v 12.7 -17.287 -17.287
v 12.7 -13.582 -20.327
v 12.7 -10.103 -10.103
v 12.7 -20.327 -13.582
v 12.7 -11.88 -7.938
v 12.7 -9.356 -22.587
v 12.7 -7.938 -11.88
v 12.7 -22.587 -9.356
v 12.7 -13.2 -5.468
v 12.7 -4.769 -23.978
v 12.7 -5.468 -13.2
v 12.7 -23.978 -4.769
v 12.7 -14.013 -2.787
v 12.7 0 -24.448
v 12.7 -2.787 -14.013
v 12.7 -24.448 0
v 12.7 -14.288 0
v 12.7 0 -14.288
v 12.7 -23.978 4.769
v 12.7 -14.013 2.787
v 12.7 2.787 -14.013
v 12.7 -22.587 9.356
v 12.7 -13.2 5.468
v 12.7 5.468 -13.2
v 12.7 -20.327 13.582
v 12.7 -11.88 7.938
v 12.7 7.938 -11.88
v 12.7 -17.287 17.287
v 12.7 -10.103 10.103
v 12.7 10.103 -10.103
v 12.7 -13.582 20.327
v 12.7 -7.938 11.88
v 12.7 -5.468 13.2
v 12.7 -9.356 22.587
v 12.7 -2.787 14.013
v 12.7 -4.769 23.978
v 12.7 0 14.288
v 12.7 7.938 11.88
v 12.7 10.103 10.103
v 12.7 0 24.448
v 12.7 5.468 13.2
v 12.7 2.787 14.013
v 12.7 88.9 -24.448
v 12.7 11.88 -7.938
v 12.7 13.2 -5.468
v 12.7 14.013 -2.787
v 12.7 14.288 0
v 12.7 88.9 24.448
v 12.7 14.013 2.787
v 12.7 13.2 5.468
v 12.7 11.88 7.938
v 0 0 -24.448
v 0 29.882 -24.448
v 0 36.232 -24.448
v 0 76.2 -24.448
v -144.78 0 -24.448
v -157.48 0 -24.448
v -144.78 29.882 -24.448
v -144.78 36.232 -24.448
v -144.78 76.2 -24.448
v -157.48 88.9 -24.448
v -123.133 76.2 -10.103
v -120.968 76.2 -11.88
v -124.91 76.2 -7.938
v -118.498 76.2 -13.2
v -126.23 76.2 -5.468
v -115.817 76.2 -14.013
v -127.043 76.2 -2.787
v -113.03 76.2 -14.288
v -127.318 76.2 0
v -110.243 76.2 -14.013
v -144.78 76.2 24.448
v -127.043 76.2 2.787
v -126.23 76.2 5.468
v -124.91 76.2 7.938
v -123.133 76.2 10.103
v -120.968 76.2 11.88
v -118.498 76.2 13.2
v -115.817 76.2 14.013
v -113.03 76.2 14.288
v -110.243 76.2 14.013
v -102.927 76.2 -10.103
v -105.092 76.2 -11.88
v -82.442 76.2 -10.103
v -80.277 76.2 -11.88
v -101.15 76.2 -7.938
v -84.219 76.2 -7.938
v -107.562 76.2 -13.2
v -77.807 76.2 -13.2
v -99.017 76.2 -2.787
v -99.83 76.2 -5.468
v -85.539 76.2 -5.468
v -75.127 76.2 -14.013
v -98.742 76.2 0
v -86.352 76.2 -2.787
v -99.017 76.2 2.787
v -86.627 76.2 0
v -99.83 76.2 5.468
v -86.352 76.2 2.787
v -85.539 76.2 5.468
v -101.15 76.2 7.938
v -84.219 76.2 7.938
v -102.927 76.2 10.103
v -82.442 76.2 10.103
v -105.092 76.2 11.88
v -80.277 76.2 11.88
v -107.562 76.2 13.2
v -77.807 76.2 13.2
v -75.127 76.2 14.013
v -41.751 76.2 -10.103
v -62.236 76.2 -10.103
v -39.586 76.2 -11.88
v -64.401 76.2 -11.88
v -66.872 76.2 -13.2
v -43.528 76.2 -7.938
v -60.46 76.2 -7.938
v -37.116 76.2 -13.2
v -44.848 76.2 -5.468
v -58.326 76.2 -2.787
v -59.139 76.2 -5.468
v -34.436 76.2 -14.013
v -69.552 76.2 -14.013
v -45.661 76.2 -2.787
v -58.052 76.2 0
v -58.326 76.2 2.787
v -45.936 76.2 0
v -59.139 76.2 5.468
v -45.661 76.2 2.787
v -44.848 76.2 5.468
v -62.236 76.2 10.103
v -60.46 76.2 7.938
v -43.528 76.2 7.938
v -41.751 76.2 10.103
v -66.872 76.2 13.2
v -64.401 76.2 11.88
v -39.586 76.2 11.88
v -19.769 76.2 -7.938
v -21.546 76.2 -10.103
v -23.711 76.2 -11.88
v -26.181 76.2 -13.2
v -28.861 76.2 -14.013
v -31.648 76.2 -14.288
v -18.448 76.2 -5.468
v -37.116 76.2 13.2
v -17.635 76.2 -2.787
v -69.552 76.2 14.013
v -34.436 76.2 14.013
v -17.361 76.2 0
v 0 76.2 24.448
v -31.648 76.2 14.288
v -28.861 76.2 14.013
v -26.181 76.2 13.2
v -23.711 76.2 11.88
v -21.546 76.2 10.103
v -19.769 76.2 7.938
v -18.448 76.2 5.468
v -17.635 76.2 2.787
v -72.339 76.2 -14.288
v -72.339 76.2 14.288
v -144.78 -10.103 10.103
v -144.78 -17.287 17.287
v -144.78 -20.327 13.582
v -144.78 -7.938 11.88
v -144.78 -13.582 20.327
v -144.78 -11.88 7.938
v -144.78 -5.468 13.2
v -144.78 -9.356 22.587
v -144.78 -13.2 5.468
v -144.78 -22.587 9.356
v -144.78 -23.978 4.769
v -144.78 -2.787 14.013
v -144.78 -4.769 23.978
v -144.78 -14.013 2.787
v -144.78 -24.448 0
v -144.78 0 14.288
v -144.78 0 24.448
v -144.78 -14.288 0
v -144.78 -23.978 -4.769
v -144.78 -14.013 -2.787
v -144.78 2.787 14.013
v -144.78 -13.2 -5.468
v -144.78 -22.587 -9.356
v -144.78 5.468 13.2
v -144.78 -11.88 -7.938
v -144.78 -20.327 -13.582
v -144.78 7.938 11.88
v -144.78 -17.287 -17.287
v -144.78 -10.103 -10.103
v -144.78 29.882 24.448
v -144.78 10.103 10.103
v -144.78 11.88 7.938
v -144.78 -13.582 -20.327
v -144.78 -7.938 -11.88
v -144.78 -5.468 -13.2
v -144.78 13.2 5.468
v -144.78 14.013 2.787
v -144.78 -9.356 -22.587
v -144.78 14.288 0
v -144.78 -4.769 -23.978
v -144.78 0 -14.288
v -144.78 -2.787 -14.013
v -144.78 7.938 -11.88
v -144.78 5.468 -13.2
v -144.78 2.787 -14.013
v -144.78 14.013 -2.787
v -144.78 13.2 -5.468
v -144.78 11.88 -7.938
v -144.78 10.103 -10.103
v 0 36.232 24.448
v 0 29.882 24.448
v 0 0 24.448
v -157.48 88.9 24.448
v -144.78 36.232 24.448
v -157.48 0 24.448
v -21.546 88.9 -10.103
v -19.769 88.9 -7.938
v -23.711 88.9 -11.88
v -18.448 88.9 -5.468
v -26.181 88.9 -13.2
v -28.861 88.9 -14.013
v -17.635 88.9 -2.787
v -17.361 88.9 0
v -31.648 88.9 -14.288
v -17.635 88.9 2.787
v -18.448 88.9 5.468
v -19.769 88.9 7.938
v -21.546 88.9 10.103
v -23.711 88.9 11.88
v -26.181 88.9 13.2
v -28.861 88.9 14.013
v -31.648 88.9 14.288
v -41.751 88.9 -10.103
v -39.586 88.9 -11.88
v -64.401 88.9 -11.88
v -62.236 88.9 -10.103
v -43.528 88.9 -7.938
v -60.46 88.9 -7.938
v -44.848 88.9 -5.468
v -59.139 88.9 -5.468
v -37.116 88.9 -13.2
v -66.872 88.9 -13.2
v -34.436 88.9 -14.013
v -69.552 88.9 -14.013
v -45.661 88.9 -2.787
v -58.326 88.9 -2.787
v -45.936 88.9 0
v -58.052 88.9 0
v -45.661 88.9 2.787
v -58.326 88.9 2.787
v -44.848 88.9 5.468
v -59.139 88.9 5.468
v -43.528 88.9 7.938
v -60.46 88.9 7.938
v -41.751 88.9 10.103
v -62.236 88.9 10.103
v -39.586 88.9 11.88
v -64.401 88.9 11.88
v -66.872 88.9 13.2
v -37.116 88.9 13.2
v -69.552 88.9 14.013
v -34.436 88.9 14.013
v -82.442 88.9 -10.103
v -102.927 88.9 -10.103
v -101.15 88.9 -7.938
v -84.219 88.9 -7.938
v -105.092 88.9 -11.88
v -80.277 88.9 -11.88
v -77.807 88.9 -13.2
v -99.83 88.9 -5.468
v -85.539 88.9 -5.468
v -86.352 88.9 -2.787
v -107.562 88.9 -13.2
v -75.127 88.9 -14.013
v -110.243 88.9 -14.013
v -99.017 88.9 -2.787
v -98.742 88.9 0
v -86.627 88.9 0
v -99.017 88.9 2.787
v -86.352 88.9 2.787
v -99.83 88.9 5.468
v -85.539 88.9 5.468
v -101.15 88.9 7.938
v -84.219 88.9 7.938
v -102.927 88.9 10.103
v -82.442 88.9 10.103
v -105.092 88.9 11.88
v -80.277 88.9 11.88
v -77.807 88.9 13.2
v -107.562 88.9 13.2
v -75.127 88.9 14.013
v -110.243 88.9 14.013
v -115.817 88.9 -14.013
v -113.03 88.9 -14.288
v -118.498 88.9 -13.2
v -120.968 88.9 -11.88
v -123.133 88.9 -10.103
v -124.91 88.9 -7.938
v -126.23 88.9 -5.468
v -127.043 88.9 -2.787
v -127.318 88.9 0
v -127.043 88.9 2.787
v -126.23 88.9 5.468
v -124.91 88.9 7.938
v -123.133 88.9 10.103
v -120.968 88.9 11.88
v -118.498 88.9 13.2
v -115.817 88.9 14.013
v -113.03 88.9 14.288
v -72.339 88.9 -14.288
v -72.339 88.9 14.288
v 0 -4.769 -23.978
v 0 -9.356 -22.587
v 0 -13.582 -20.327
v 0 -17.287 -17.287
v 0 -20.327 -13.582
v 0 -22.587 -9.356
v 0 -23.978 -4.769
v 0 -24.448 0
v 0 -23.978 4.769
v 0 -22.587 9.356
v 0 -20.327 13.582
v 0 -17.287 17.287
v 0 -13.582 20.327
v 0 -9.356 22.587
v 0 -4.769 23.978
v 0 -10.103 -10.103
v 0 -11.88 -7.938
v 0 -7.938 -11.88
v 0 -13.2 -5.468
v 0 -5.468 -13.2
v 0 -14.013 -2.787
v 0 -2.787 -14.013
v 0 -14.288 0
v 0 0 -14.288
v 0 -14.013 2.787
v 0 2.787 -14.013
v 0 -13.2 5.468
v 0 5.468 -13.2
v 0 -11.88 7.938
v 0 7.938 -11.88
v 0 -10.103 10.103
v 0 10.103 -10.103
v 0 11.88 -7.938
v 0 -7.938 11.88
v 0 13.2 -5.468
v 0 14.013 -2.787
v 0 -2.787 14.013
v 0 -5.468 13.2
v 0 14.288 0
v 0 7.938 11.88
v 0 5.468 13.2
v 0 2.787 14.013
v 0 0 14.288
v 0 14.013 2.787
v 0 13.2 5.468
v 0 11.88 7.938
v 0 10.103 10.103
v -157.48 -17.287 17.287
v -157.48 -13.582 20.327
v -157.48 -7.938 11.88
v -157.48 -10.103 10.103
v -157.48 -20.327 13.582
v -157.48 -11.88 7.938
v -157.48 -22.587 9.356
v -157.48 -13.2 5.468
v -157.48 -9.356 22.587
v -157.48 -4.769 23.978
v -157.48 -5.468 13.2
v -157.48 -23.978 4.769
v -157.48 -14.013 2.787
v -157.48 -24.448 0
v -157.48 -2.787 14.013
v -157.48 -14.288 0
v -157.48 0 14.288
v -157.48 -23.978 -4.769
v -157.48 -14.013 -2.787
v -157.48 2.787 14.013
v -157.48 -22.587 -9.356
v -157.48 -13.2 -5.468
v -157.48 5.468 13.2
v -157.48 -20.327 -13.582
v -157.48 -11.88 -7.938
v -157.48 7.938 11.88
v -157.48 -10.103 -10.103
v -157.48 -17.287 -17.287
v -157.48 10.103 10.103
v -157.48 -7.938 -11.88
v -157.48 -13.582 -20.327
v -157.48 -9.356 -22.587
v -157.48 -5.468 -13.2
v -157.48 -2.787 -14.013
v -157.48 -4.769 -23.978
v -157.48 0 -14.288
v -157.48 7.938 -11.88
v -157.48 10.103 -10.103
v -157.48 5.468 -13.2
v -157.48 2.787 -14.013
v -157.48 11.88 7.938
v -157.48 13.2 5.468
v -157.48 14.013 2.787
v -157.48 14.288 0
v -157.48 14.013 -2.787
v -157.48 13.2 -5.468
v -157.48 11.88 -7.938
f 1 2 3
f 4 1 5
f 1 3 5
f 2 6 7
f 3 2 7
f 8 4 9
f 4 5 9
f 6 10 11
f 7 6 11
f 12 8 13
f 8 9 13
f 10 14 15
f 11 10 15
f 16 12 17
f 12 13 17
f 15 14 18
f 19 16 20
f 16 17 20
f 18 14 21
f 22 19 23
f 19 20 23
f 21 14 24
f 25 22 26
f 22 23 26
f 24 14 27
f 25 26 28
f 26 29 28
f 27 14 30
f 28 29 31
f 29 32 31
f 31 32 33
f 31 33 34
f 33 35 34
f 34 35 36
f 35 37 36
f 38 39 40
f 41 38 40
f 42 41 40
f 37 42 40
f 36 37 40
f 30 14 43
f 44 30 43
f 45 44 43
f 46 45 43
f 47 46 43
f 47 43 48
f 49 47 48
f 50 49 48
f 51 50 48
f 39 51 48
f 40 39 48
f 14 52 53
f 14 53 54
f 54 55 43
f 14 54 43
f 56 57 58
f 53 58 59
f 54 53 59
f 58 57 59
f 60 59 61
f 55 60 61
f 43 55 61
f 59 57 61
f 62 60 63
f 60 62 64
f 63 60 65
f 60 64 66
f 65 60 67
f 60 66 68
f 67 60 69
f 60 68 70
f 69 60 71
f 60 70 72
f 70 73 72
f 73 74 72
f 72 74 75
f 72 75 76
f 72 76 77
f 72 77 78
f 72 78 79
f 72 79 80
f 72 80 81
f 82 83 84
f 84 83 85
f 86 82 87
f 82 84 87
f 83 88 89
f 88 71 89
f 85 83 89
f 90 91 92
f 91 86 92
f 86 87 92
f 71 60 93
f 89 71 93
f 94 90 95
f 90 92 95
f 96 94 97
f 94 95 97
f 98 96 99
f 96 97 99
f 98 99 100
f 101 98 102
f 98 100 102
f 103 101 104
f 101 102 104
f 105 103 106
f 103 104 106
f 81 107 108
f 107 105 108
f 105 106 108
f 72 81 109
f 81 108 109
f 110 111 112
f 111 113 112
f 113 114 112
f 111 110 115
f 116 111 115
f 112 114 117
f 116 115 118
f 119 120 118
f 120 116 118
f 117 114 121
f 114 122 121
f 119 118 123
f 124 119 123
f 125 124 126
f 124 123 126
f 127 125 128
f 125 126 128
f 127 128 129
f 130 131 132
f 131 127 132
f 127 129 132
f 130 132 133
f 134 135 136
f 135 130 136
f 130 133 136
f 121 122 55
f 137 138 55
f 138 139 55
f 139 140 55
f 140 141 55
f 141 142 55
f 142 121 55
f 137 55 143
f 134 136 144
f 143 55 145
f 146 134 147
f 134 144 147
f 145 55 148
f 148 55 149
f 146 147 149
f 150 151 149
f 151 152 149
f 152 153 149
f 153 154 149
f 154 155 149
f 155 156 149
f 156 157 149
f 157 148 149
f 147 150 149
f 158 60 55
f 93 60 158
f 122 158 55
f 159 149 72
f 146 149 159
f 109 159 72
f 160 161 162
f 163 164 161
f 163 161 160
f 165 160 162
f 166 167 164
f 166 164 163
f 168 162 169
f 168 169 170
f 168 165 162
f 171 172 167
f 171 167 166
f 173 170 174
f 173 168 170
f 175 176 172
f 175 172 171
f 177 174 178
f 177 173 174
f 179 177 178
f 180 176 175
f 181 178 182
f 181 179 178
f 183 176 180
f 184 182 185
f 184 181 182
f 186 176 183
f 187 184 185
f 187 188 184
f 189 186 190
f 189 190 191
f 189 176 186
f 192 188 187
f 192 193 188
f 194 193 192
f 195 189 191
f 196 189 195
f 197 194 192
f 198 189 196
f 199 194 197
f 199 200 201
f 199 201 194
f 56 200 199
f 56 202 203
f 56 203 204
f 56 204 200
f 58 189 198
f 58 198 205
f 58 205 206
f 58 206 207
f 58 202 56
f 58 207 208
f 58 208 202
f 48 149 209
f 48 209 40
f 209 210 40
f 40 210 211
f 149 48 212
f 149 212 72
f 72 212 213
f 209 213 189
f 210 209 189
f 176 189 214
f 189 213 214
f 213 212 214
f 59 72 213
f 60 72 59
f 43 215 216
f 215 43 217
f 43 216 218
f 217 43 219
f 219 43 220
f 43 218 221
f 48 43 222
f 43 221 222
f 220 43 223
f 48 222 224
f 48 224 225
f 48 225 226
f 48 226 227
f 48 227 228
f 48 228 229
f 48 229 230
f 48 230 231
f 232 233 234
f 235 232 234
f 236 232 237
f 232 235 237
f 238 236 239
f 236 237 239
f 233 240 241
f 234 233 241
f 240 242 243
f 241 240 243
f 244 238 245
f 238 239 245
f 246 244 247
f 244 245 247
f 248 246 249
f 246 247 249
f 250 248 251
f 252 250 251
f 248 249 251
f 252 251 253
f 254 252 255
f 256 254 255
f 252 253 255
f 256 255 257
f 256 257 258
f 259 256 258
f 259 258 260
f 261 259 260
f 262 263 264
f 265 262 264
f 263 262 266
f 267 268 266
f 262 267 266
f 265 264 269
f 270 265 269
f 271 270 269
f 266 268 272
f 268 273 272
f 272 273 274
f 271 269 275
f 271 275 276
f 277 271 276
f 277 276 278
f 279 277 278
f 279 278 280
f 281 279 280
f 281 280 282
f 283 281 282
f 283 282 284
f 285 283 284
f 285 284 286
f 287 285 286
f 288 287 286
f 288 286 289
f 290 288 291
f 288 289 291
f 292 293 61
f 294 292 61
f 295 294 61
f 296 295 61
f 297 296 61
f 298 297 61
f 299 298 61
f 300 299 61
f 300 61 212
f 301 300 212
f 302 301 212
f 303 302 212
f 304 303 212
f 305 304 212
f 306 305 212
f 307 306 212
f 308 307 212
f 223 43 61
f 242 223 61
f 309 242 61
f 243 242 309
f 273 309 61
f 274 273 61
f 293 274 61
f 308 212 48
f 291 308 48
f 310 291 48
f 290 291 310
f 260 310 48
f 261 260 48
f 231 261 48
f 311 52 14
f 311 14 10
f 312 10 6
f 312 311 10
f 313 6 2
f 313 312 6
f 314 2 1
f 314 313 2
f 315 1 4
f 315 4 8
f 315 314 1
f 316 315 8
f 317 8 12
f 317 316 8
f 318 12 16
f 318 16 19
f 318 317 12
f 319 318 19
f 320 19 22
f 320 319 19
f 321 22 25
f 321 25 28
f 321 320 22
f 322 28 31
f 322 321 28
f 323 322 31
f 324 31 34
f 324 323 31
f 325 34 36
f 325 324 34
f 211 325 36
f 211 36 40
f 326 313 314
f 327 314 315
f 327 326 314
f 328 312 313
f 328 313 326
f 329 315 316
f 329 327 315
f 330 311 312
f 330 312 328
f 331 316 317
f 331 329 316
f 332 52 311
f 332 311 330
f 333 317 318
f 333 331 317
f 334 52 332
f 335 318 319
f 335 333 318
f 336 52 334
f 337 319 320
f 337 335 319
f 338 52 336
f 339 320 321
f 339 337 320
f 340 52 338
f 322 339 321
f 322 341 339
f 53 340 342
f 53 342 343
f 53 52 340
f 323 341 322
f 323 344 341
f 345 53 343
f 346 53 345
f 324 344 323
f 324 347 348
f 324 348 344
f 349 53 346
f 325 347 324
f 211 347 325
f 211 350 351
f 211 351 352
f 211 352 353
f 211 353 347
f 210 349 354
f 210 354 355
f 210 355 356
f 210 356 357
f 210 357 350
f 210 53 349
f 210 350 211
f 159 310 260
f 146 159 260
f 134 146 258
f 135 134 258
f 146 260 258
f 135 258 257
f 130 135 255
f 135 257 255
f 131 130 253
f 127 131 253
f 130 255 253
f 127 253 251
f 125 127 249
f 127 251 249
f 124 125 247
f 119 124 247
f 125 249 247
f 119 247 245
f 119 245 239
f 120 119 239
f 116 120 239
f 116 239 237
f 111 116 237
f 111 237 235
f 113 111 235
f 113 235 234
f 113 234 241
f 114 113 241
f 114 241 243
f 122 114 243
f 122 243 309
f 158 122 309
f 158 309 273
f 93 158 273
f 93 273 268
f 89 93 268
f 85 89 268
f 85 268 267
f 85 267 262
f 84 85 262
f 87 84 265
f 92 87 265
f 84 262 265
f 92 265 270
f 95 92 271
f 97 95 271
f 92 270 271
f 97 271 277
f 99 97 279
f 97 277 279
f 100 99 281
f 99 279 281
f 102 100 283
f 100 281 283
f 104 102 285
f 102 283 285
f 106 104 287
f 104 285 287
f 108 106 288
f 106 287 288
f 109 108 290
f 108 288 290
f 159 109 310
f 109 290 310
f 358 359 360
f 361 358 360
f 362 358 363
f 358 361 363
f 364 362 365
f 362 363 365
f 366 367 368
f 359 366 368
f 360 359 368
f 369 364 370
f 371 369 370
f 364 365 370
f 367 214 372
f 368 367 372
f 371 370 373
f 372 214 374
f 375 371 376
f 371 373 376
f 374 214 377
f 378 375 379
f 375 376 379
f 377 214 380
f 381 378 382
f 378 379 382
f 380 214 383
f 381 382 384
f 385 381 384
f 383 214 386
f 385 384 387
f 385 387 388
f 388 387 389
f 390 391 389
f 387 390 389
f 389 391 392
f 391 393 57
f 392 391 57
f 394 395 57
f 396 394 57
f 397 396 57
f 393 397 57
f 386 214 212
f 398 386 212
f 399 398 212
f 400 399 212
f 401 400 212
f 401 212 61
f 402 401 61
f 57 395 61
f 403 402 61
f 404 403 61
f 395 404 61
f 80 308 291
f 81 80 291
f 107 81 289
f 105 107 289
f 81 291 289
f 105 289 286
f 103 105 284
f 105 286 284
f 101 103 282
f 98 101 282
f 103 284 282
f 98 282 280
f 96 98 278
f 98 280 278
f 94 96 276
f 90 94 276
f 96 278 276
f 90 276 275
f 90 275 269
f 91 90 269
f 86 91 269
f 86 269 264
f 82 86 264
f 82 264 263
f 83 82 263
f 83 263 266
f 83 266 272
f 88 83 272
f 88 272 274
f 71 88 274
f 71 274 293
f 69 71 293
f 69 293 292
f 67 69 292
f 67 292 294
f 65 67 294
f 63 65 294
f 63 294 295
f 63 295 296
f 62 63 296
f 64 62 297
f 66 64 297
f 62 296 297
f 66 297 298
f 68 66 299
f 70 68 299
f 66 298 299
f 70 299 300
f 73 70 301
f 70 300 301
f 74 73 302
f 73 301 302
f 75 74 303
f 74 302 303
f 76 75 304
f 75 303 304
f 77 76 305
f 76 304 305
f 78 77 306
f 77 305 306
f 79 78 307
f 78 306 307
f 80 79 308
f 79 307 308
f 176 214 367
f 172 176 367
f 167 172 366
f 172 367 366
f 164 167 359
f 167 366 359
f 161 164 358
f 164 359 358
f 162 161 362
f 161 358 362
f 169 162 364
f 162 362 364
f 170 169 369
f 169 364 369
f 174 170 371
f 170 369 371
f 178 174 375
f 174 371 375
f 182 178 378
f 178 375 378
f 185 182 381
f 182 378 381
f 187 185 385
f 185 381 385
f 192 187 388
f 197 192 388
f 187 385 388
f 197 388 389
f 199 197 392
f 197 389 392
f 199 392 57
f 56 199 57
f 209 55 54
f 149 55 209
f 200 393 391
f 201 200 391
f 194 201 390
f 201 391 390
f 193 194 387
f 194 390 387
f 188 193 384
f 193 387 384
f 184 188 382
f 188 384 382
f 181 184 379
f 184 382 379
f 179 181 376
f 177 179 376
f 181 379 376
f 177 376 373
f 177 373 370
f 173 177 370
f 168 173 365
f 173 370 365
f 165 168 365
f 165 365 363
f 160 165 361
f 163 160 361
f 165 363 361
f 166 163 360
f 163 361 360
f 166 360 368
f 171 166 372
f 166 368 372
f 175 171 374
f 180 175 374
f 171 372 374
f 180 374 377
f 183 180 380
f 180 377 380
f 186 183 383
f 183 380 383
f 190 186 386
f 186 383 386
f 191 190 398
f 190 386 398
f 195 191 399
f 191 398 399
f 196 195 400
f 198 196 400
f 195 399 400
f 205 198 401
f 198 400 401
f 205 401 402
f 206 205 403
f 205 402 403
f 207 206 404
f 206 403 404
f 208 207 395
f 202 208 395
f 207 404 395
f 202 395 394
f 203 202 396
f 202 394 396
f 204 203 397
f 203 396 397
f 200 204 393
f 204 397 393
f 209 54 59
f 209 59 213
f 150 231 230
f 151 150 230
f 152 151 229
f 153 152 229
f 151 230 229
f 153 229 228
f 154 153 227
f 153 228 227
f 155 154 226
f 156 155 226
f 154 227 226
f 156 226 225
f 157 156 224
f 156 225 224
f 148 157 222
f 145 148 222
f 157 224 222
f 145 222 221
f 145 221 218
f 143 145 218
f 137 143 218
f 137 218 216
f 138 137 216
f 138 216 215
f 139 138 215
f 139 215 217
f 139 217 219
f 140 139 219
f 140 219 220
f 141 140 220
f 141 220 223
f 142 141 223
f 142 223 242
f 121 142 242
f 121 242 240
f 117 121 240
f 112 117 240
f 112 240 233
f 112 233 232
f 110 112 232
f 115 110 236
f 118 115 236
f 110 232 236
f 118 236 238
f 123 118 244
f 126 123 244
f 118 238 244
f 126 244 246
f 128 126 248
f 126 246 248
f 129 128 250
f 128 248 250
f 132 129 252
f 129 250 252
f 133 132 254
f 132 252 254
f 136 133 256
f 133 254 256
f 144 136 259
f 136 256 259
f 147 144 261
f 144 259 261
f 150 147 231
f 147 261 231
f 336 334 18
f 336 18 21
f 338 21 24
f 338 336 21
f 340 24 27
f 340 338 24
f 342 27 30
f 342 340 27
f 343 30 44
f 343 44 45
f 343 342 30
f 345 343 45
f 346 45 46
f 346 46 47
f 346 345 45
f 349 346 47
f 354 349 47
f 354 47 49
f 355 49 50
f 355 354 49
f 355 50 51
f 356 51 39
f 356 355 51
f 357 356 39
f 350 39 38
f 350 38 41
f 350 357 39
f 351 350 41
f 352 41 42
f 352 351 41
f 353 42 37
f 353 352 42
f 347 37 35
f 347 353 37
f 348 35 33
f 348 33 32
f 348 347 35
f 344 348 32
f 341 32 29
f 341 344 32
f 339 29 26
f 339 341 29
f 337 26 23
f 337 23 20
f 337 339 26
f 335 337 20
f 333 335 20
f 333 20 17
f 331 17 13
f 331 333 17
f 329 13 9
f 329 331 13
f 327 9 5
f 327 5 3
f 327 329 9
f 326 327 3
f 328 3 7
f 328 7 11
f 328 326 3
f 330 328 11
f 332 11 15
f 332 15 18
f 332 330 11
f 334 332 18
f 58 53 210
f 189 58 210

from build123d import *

# Parameters (mm, degrees)
SKETCH1_R           = 14.2875
BOSS_EXTRUDE1_DEPTH = 12.7
SKETCH2_W           = 48.895
SKETCH2_H           = 6.35
SKETCH2_H_2         = 12.7
BOSS_EXTRUDE2_DEPTH = 144.78
BOSS_EXTRUDE3_START = 12.7
SKETCH3_R           = 14.2875
BOSS_EXTRUDE3_DEPTH = 12.7
SKETCH4_R           = 14.2875
CUT_EXTRUDE1_DEPTH  = 25.654


with BuildPart() as part:
    # Sketch1 → Boss-Extrude1 (new body)
    with BuildSketch(Plane(origin=(0, 0, 0), x_dir=(0, 0, -1), z_dir=(1, 0, 0))):
        with BuildLine():
            Line((-24.4475, 0), (-24.4475, 88.9))
            Line((-24.4475, 88.9), (24.4475, 88.9))
            Line((24.4475, 88.9), (24.4475, 0))
            ThreePointArc((24.4475, 0), (0, -24.4475), (-24.4475, 0))
        make_face()
        Circle(SKETCH1_R, mode=Mode.SUBTRACT)
    extrude(amount=BOSS_EXTRUDE1_DEPTH)

    # Sketch2 → Boss-Extrude2 (add)
    with BuildSketch(Plane.ZY):
        with Locations((0, 33.056893832)):
            Rectangle(SKETCH2_W, SKETCH2_H)
        with Locations((0, 82.55)):
            Rectangle(SKETCH2_W, SKETCH2_H_2)
    extrude(amount=BOSS_EXTRUDE2_DEPTH)

    # Sketch3 → Boss-Extrude3 (add)
    with BuildSketch(Plane.ZY.offset(144.78).offset(BOSS_EXTRUDE3_START)):
        with BuildLine():
            Line((-24.4475, 0), (-24.4475, 88.9))
            Line((-24.4475, 88.9), (24.4475, 88.9))
            Line((24.4475, 88.9), (24.4475, 0))
            ThreePointArc((24.4475, 0), (0, -24.4475), (-24.4475, 0))
        make_face()
        with Locations(Location((0, 0, 0), (0, 0, 180))):
            Circle(SKETCH3_R, mode=Mode.SUBTRACT)
    extrude(amount=-BOSS_EXTRUDE3_DEPTH)

    # Sketch4 → Cut-Extrude1 (cut)
    with BuildSketch(Plane(origin=(0, 88.9, 0), x_dir=(1, 0, 0), z_dir=(0, 1, 0))):
        with Locations(Location((-113.03, 0, 0), (0, 0, 270))):
            Circle(SKETCH4_R)
        with Locations(Location((-72.3392, 0, 0), (0, 0, 270))):
            Circle(SKETCH4_R)
        with Locations(Location((-31.6484, 0, 0), (0, 0, 270))):
            Circle(SKETCH4_R)
    extrude(amount=-CUT_EXTRUDE1_DEPTH, mode=Mode.SUBTRACT)


solid = part.part
